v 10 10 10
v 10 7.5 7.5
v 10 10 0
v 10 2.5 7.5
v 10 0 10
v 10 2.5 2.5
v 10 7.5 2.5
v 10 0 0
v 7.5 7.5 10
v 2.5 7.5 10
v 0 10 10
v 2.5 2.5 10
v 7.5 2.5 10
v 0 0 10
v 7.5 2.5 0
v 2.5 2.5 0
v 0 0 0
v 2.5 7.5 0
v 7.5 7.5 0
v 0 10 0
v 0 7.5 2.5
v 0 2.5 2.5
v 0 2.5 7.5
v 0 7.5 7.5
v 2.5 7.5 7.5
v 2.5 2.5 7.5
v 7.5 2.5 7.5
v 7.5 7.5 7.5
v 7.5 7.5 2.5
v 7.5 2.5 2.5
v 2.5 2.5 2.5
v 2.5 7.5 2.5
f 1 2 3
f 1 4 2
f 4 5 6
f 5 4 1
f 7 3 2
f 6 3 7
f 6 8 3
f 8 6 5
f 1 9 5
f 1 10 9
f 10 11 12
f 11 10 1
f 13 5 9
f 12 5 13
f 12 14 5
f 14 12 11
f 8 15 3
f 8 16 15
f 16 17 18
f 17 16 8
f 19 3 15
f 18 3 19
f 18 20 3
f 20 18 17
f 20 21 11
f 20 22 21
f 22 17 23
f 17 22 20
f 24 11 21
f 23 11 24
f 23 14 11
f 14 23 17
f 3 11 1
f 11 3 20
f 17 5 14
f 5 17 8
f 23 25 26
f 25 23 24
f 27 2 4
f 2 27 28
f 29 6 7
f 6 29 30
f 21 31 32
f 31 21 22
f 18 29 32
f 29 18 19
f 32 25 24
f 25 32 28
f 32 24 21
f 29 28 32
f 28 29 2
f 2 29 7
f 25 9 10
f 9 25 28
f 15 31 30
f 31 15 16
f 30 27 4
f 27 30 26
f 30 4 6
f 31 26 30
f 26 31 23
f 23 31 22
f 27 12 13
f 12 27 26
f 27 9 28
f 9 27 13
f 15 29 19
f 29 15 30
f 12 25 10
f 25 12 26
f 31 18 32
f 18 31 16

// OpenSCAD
difference(){
     cube([10, 10, 10]);
      
     translate([0,2.5,2.5]) cube([10, 5, 5]);
     translate([2.5,2.5,0]) cube([5, 5, 10]);
}
